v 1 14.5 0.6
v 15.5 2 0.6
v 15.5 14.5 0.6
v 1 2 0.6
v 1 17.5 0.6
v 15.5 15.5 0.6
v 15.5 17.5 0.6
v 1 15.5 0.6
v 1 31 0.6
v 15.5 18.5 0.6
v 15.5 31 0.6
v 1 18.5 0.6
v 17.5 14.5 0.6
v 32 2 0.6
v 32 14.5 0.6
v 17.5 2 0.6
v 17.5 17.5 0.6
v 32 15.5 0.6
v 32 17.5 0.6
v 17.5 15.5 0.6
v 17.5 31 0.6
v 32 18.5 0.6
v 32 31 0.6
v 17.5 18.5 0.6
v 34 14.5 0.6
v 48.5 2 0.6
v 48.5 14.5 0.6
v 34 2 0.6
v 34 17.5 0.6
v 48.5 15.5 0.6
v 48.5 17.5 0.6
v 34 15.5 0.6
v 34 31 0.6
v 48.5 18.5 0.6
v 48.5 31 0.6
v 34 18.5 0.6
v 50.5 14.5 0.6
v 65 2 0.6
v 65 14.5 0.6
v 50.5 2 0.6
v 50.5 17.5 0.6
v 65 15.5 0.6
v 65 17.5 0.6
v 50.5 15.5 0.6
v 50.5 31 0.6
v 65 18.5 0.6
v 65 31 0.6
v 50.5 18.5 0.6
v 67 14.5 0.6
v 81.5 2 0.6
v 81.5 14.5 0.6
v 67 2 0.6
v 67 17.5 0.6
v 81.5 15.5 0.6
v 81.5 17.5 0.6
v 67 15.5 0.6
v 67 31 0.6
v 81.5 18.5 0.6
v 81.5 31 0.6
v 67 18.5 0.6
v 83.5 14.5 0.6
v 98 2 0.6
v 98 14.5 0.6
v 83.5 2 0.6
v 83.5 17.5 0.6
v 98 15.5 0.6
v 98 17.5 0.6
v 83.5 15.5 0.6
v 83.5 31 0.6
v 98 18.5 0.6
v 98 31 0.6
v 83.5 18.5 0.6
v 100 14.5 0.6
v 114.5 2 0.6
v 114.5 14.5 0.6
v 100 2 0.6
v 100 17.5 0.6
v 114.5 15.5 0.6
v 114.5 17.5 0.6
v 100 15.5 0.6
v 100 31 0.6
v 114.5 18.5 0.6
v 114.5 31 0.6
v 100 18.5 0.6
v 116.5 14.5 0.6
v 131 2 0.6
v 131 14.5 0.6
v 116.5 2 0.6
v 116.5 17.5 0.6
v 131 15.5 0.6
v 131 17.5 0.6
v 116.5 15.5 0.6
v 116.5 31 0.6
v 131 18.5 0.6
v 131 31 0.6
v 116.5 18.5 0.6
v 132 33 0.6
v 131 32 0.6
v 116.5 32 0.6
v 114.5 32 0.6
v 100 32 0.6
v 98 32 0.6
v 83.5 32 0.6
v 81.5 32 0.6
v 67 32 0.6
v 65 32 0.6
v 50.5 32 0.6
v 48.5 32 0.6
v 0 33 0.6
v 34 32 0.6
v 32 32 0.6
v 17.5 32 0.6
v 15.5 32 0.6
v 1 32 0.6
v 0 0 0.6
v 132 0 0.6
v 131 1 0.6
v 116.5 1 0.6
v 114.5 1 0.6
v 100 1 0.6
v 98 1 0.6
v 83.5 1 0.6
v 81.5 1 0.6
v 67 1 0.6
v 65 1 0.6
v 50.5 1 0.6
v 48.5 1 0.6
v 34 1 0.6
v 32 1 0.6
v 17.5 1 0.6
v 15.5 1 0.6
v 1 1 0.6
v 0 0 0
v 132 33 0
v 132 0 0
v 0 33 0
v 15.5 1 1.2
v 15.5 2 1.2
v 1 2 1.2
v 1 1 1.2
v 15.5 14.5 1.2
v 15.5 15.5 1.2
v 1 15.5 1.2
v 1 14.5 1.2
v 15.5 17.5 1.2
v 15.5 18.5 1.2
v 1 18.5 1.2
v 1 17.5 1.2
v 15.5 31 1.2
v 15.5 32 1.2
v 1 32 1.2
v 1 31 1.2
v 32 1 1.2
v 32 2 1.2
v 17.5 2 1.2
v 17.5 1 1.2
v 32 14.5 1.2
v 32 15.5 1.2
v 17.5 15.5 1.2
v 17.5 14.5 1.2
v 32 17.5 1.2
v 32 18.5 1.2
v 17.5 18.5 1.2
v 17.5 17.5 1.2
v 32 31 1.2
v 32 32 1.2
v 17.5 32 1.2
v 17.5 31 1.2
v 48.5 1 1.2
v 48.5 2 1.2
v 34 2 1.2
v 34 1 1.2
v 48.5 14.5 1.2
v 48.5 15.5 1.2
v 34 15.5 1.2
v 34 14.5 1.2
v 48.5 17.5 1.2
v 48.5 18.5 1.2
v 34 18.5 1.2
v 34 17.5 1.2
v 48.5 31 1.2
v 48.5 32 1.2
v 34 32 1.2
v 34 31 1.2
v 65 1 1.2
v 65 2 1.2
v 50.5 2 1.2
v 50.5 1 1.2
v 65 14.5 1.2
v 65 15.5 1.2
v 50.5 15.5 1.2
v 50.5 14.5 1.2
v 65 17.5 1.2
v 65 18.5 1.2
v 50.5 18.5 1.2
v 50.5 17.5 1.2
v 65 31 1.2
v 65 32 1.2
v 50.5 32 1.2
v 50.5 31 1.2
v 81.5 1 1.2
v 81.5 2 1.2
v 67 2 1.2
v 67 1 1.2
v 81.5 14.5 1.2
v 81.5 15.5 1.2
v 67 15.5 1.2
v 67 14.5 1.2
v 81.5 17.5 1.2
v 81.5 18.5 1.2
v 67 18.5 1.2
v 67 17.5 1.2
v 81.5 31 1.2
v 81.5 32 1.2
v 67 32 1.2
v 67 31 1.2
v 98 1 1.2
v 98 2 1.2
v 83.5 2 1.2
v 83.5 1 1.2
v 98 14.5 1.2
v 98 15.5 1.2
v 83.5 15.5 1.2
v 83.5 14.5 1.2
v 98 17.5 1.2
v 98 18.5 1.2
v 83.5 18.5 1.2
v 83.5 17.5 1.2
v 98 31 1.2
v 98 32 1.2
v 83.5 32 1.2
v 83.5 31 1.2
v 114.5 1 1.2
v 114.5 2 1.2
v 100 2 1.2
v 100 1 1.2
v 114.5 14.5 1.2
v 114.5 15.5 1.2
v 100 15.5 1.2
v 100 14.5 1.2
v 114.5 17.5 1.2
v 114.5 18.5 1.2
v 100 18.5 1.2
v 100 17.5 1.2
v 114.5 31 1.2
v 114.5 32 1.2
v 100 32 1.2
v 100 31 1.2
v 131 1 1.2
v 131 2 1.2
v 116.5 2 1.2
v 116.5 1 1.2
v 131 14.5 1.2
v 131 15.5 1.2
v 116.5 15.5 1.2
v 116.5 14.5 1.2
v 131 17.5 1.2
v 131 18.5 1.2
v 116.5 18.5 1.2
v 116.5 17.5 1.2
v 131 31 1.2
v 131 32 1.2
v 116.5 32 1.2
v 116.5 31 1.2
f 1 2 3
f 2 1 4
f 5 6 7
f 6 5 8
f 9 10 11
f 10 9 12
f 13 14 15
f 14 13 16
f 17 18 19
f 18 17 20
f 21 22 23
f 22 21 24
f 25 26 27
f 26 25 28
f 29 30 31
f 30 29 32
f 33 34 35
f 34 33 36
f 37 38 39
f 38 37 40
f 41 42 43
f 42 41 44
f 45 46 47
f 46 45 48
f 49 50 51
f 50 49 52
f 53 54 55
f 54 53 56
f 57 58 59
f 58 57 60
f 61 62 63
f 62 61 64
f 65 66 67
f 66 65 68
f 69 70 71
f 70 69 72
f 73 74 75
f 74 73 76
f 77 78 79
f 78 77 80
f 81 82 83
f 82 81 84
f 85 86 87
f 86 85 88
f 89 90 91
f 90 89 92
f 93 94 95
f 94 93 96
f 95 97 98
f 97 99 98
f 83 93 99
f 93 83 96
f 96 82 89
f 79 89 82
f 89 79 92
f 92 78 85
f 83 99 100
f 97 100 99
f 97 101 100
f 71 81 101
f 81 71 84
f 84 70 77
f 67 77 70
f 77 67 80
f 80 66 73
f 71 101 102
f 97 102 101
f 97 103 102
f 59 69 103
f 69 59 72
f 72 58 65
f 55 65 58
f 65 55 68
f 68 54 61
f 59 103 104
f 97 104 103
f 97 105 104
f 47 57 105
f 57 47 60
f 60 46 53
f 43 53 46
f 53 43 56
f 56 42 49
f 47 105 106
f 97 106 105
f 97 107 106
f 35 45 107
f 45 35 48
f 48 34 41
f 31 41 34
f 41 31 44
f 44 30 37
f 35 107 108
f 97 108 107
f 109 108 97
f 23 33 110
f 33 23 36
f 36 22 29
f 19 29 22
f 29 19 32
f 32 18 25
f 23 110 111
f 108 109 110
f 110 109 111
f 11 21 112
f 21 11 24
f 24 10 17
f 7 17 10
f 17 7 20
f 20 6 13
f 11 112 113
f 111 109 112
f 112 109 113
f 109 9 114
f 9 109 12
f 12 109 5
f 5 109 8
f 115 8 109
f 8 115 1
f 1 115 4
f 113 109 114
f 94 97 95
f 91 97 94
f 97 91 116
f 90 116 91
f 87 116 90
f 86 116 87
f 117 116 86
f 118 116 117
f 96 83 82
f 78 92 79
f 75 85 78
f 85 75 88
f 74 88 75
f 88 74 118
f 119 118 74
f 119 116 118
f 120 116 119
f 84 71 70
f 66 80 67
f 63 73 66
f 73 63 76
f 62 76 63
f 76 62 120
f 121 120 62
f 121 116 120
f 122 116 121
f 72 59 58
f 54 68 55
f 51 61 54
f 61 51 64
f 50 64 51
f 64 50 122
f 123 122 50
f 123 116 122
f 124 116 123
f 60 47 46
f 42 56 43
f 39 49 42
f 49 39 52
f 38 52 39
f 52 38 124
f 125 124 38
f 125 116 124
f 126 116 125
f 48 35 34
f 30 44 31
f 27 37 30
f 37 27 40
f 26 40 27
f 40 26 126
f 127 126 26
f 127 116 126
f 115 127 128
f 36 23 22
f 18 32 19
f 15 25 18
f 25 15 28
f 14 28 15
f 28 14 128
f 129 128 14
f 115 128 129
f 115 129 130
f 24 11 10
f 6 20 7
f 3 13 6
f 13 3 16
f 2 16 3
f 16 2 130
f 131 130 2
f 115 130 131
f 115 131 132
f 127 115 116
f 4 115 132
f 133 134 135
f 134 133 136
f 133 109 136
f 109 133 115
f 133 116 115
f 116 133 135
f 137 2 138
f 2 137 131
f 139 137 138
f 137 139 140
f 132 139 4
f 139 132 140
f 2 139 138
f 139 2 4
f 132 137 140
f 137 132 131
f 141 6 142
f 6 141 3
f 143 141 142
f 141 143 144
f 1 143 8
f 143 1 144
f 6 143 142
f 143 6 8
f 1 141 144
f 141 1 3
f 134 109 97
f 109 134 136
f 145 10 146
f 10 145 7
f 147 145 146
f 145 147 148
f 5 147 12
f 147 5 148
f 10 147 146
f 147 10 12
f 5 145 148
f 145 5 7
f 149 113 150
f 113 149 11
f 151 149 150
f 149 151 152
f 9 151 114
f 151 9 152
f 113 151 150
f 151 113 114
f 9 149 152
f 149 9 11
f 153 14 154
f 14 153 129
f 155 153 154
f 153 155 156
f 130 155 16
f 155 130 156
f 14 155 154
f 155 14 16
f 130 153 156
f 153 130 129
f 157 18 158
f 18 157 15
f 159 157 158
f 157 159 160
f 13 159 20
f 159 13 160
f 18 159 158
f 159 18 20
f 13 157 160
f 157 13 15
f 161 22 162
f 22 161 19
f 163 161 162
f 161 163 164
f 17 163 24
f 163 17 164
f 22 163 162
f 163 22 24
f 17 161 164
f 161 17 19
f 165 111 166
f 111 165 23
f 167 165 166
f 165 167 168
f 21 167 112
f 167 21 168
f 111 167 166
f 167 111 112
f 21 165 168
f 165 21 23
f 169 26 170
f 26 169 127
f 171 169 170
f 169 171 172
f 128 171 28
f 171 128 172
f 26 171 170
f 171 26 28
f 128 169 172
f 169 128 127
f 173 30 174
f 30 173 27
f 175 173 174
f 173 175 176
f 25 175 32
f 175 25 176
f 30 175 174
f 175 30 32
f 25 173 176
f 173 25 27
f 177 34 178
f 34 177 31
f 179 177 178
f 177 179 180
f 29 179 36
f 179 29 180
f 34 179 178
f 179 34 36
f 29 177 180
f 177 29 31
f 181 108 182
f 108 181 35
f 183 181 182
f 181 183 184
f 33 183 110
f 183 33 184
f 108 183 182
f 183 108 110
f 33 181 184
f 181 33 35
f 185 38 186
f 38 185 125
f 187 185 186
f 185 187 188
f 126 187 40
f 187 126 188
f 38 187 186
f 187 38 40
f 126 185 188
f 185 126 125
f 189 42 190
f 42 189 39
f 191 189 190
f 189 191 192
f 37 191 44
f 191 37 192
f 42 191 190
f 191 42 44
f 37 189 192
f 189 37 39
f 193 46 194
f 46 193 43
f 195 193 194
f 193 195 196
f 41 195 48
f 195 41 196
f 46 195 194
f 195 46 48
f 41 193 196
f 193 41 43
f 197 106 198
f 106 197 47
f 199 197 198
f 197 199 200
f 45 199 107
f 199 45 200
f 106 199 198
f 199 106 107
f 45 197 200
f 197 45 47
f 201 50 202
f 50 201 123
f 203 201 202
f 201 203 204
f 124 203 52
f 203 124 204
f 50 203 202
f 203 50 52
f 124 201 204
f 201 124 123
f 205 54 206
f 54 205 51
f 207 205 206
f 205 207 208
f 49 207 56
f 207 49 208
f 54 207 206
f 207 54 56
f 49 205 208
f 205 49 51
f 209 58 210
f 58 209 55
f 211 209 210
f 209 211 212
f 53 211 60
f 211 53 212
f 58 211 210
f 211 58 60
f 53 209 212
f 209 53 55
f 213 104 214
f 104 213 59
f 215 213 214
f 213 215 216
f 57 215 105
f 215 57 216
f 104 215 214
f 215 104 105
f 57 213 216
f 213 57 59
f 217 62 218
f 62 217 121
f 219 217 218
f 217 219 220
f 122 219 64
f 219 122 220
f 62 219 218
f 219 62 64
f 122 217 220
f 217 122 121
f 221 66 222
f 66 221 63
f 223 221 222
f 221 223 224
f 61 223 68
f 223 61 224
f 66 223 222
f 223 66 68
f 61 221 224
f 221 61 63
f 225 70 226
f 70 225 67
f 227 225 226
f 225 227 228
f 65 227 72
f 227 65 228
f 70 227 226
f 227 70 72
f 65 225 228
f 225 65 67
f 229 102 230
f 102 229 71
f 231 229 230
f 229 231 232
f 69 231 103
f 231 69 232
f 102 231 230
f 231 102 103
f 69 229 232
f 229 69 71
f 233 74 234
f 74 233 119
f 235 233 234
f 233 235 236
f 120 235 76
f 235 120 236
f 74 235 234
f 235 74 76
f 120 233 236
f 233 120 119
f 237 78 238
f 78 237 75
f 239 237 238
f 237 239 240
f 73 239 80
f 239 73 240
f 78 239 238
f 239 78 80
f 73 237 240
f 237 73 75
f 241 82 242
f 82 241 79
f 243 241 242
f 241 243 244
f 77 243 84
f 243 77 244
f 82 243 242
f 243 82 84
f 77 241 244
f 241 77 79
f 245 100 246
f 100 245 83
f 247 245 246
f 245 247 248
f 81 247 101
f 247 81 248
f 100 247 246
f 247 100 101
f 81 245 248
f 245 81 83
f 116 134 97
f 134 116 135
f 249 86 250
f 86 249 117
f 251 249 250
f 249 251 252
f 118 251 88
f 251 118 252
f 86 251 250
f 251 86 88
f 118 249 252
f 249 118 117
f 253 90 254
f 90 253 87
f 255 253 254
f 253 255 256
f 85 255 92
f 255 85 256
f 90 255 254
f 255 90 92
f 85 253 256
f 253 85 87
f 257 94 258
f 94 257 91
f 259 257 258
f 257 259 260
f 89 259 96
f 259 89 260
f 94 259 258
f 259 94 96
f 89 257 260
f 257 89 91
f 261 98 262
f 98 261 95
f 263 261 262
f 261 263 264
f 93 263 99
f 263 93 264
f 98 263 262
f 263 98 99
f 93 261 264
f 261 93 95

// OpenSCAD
// length of the cube in mm tenth
length=165;

// how many rows to generate
rows=2;

// how many pixels to generate in a row
cols=8;

// thikness of the wall in mm tenth
wall=10;

// bottom thikness in mm tenth
bottomThikness=6;

// lenght off the inner 
innerLength=length-wall*2;


// scale smaller so slicer sice is correct
scale(0.1) {
  
  for(x=[0:cols-1]) {
    for(y=[0:rows-1]) {
      BottomCube(x*length,y*length);
    }
  }
}



module BottomCube(xOffset,yOffset) {
  translate([xOffset,yOffset,0]) {
    cube([length,length,bottomThikness]);
    translate([wall,wall,bottomThikness]) {
      cube([innerLength,wall,bottomThikness]);
    }
    translate([wall,length-wall*2,bottomThikness]) {
      cube([innerLength,wall,bottomThikness]);
    }
  }
}
